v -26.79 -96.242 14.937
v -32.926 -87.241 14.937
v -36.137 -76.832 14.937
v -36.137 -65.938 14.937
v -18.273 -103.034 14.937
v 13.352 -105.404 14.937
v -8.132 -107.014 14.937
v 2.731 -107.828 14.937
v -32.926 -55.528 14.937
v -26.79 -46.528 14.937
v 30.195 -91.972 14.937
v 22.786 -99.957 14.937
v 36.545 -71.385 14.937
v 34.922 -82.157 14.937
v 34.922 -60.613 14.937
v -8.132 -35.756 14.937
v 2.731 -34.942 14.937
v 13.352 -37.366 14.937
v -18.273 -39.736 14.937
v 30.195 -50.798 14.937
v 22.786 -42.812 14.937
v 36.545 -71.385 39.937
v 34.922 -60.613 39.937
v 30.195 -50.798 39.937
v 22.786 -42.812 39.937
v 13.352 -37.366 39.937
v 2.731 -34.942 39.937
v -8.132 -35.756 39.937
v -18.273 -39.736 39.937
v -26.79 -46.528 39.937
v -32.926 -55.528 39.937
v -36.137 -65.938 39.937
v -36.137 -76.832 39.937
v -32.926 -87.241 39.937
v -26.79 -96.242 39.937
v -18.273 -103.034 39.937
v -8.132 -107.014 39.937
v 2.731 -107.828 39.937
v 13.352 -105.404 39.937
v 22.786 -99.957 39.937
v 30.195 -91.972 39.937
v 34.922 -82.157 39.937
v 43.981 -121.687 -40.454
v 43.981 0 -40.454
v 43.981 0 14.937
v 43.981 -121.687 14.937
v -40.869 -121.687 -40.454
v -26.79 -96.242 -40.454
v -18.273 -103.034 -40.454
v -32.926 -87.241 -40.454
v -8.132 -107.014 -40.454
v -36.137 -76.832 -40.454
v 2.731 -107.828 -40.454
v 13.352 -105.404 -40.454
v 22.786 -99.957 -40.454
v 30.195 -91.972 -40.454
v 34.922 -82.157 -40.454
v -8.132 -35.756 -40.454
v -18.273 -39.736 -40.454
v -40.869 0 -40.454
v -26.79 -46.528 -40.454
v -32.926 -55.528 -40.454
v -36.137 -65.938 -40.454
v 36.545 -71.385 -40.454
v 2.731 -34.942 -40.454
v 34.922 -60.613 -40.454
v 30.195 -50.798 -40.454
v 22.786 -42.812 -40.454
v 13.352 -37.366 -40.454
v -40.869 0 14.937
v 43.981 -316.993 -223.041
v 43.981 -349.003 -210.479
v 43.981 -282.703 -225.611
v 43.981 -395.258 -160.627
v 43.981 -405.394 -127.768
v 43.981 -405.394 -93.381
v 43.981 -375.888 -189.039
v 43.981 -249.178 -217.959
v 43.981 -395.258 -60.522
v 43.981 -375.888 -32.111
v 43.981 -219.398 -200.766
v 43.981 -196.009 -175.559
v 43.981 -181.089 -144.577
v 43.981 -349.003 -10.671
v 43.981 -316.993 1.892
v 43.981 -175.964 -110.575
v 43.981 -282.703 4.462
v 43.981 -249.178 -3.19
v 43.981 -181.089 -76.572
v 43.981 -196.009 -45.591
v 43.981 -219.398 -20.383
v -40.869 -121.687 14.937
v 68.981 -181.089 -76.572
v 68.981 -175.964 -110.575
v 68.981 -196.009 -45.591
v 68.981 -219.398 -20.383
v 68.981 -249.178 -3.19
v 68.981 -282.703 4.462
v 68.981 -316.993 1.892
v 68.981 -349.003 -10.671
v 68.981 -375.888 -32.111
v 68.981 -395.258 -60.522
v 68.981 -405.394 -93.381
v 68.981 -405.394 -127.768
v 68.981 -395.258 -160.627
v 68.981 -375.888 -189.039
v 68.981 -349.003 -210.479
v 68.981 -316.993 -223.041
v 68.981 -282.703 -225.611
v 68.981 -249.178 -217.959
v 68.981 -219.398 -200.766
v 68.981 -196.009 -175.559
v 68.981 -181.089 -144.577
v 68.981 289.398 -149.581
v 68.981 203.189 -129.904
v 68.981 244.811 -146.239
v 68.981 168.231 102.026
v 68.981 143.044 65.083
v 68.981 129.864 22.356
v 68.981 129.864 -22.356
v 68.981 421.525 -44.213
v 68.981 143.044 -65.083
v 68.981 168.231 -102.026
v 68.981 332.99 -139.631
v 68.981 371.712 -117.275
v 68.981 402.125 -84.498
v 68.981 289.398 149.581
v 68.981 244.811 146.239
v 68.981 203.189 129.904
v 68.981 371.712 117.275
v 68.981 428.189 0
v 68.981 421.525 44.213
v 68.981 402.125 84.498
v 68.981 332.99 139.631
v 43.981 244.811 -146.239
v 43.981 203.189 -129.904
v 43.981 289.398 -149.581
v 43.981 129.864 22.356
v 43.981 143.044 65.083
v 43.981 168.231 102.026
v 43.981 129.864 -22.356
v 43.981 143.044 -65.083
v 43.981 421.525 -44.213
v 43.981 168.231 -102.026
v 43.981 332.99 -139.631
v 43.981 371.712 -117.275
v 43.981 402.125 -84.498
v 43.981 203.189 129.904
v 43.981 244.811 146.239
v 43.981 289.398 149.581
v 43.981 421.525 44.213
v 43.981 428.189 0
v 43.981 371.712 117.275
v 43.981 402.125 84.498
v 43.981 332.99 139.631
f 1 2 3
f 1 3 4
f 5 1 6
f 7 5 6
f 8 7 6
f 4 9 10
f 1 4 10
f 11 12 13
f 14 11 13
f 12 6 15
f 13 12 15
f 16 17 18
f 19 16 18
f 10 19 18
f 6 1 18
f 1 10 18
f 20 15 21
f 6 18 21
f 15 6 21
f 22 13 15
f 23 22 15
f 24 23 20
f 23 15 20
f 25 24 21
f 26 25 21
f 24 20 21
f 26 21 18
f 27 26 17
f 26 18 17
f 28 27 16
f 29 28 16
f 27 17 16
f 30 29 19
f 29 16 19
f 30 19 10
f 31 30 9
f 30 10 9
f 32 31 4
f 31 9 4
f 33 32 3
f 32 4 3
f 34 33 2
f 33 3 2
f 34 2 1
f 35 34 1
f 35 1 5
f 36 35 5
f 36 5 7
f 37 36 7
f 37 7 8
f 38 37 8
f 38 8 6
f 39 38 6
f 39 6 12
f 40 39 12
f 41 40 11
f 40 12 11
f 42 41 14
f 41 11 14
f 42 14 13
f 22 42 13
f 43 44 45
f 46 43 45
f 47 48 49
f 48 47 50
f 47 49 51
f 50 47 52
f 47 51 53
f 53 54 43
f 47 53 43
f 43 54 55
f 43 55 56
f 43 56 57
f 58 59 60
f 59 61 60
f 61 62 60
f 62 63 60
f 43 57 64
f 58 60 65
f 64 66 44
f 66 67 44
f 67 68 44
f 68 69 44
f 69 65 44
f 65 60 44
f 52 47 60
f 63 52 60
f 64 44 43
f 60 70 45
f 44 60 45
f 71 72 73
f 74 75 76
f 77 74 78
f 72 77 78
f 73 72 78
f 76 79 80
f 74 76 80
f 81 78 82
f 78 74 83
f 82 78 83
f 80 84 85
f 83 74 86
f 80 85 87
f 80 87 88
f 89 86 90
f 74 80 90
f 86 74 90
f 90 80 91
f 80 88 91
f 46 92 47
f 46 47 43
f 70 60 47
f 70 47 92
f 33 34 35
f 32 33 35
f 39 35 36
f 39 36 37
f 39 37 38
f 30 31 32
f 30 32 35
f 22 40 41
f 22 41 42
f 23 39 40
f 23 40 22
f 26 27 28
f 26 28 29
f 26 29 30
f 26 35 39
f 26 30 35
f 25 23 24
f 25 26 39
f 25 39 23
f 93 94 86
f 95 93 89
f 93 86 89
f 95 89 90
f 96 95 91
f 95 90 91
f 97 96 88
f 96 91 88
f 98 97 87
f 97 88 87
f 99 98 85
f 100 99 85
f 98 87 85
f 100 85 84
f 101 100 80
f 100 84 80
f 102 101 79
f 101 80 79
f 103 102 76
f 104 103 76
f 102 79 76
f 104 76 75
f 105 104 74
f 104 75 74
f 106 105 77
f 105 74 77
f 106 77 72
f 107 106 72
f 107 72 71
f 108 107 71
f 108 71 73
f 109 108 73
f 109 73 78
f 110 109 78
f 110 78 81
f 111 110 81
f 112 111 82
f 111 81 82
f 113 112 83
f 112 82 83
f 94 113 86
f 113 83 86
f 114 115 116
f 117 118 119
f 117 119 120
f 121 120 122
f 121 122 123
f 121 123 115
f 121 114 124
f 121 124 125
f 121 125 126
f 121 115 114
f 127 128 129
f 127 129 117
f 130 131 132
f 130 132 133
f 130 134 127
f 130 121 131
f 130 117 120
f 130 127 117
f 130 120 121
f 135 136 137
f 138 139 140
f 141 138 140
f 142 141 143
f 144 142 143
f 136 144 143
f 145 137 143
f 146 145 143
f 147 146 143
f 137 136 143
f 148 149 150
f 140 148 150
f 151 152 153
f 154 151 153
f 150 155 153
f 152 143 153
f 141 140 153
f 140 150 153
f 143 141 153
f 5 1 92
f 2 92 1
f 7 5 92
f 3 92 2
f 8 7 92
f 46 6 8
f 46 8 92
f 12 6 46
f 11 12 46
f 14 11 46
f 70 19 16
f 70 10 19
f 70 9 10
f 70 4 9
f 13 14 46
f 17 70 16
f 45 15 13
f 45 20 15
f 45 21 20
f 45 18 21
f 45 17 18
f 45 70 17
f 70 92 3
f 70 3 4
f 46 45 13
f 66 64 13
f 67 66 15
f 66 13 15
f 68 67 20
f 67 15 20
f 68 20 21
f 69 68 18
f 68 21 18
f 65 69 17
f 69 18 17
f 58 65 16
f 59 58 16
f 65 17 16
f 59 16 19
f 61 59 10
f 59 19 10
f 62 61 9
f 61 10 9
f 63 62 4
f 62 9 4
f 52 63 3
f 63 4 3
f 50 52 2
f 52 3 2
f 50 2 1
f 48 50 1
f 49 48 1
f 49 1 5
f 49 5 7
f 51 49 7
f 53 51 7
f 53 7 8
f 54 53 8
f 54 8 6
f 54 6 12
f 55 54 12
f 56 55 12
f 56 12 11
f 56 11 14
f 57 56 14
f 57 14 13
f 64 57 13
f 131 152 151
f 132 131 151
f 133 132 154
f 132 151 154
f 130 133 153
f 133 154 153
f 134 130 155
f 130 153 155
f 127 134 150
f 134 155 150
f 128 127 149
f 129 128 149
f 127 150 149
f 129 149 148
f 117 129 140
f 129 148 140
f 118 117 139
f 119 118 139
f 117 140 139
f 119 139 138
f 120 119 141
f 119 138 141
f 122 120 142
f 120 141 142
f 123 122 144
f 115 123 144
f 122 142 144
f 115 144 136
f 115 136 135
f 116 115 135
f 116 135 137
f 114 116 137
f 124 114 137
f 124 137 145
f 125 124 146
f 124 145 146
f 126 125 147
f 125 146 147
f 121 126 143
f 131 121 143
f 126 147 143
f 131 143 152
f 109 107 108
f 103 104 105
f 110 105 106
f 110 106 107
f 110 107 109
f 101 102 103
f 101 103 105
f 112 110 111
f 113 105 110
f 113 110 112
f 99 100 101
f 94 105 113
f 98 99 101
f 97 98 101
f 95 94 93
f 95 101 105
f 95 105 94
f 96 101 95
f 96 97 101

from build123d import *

# Parameters (mm, degrees)
F0_W     = 84.849983
F0_H     = 55.391043
F1_DEPTH = 121.687233
F2_R     = 36.545391
F3_DEPTH = 102.397002
F4_DEPTH = 25
F5_R     = 115.359124
F5_R_2   = 150
F6_DEPTH = 25


with BuildPart() as f1:
    # F0 (on Front) → F1 (new body)
    with BuildSketch(Plane.XZ):
        with Locations((1.555905, -12.758598)):
            Rectangle(F0_W, F0_H)
    extrude(amount=F1_DEPTH)

    # F2 (on face) → F3 (cut)
    with BuildSketch(Plane.XY.offset(14.936924)):
        with Locations((0, -71.384817)):
            Circle(F2_R)
    extrude(amount=-F3_DEPTH, mode=Mode.SUBTRACT)


with BuildPart() as f4:
    # F2 (on face) → F4 (new body)
    with BuildSketch(Plane.XY.offset(14.936924)):
        with Locations((0, -71.384817)):
            Circle(F2_R)
    extrude(amount=F4_DEPTH)


with BuildPart() as f6:
    # F5 (on face) → F6 (new body)
    with BuildSketch(Plane.YZ.offset(43.980896)):
        with Locations((-291.323417, -110.57464)):
            Circle(F5_R)
        with Locations((278.188881, 0)):
            Circle(F5_R_2)
    extrude(amount=F6_DEPTH)


solid = Compound([f1.part, f4.part, f6.part])
